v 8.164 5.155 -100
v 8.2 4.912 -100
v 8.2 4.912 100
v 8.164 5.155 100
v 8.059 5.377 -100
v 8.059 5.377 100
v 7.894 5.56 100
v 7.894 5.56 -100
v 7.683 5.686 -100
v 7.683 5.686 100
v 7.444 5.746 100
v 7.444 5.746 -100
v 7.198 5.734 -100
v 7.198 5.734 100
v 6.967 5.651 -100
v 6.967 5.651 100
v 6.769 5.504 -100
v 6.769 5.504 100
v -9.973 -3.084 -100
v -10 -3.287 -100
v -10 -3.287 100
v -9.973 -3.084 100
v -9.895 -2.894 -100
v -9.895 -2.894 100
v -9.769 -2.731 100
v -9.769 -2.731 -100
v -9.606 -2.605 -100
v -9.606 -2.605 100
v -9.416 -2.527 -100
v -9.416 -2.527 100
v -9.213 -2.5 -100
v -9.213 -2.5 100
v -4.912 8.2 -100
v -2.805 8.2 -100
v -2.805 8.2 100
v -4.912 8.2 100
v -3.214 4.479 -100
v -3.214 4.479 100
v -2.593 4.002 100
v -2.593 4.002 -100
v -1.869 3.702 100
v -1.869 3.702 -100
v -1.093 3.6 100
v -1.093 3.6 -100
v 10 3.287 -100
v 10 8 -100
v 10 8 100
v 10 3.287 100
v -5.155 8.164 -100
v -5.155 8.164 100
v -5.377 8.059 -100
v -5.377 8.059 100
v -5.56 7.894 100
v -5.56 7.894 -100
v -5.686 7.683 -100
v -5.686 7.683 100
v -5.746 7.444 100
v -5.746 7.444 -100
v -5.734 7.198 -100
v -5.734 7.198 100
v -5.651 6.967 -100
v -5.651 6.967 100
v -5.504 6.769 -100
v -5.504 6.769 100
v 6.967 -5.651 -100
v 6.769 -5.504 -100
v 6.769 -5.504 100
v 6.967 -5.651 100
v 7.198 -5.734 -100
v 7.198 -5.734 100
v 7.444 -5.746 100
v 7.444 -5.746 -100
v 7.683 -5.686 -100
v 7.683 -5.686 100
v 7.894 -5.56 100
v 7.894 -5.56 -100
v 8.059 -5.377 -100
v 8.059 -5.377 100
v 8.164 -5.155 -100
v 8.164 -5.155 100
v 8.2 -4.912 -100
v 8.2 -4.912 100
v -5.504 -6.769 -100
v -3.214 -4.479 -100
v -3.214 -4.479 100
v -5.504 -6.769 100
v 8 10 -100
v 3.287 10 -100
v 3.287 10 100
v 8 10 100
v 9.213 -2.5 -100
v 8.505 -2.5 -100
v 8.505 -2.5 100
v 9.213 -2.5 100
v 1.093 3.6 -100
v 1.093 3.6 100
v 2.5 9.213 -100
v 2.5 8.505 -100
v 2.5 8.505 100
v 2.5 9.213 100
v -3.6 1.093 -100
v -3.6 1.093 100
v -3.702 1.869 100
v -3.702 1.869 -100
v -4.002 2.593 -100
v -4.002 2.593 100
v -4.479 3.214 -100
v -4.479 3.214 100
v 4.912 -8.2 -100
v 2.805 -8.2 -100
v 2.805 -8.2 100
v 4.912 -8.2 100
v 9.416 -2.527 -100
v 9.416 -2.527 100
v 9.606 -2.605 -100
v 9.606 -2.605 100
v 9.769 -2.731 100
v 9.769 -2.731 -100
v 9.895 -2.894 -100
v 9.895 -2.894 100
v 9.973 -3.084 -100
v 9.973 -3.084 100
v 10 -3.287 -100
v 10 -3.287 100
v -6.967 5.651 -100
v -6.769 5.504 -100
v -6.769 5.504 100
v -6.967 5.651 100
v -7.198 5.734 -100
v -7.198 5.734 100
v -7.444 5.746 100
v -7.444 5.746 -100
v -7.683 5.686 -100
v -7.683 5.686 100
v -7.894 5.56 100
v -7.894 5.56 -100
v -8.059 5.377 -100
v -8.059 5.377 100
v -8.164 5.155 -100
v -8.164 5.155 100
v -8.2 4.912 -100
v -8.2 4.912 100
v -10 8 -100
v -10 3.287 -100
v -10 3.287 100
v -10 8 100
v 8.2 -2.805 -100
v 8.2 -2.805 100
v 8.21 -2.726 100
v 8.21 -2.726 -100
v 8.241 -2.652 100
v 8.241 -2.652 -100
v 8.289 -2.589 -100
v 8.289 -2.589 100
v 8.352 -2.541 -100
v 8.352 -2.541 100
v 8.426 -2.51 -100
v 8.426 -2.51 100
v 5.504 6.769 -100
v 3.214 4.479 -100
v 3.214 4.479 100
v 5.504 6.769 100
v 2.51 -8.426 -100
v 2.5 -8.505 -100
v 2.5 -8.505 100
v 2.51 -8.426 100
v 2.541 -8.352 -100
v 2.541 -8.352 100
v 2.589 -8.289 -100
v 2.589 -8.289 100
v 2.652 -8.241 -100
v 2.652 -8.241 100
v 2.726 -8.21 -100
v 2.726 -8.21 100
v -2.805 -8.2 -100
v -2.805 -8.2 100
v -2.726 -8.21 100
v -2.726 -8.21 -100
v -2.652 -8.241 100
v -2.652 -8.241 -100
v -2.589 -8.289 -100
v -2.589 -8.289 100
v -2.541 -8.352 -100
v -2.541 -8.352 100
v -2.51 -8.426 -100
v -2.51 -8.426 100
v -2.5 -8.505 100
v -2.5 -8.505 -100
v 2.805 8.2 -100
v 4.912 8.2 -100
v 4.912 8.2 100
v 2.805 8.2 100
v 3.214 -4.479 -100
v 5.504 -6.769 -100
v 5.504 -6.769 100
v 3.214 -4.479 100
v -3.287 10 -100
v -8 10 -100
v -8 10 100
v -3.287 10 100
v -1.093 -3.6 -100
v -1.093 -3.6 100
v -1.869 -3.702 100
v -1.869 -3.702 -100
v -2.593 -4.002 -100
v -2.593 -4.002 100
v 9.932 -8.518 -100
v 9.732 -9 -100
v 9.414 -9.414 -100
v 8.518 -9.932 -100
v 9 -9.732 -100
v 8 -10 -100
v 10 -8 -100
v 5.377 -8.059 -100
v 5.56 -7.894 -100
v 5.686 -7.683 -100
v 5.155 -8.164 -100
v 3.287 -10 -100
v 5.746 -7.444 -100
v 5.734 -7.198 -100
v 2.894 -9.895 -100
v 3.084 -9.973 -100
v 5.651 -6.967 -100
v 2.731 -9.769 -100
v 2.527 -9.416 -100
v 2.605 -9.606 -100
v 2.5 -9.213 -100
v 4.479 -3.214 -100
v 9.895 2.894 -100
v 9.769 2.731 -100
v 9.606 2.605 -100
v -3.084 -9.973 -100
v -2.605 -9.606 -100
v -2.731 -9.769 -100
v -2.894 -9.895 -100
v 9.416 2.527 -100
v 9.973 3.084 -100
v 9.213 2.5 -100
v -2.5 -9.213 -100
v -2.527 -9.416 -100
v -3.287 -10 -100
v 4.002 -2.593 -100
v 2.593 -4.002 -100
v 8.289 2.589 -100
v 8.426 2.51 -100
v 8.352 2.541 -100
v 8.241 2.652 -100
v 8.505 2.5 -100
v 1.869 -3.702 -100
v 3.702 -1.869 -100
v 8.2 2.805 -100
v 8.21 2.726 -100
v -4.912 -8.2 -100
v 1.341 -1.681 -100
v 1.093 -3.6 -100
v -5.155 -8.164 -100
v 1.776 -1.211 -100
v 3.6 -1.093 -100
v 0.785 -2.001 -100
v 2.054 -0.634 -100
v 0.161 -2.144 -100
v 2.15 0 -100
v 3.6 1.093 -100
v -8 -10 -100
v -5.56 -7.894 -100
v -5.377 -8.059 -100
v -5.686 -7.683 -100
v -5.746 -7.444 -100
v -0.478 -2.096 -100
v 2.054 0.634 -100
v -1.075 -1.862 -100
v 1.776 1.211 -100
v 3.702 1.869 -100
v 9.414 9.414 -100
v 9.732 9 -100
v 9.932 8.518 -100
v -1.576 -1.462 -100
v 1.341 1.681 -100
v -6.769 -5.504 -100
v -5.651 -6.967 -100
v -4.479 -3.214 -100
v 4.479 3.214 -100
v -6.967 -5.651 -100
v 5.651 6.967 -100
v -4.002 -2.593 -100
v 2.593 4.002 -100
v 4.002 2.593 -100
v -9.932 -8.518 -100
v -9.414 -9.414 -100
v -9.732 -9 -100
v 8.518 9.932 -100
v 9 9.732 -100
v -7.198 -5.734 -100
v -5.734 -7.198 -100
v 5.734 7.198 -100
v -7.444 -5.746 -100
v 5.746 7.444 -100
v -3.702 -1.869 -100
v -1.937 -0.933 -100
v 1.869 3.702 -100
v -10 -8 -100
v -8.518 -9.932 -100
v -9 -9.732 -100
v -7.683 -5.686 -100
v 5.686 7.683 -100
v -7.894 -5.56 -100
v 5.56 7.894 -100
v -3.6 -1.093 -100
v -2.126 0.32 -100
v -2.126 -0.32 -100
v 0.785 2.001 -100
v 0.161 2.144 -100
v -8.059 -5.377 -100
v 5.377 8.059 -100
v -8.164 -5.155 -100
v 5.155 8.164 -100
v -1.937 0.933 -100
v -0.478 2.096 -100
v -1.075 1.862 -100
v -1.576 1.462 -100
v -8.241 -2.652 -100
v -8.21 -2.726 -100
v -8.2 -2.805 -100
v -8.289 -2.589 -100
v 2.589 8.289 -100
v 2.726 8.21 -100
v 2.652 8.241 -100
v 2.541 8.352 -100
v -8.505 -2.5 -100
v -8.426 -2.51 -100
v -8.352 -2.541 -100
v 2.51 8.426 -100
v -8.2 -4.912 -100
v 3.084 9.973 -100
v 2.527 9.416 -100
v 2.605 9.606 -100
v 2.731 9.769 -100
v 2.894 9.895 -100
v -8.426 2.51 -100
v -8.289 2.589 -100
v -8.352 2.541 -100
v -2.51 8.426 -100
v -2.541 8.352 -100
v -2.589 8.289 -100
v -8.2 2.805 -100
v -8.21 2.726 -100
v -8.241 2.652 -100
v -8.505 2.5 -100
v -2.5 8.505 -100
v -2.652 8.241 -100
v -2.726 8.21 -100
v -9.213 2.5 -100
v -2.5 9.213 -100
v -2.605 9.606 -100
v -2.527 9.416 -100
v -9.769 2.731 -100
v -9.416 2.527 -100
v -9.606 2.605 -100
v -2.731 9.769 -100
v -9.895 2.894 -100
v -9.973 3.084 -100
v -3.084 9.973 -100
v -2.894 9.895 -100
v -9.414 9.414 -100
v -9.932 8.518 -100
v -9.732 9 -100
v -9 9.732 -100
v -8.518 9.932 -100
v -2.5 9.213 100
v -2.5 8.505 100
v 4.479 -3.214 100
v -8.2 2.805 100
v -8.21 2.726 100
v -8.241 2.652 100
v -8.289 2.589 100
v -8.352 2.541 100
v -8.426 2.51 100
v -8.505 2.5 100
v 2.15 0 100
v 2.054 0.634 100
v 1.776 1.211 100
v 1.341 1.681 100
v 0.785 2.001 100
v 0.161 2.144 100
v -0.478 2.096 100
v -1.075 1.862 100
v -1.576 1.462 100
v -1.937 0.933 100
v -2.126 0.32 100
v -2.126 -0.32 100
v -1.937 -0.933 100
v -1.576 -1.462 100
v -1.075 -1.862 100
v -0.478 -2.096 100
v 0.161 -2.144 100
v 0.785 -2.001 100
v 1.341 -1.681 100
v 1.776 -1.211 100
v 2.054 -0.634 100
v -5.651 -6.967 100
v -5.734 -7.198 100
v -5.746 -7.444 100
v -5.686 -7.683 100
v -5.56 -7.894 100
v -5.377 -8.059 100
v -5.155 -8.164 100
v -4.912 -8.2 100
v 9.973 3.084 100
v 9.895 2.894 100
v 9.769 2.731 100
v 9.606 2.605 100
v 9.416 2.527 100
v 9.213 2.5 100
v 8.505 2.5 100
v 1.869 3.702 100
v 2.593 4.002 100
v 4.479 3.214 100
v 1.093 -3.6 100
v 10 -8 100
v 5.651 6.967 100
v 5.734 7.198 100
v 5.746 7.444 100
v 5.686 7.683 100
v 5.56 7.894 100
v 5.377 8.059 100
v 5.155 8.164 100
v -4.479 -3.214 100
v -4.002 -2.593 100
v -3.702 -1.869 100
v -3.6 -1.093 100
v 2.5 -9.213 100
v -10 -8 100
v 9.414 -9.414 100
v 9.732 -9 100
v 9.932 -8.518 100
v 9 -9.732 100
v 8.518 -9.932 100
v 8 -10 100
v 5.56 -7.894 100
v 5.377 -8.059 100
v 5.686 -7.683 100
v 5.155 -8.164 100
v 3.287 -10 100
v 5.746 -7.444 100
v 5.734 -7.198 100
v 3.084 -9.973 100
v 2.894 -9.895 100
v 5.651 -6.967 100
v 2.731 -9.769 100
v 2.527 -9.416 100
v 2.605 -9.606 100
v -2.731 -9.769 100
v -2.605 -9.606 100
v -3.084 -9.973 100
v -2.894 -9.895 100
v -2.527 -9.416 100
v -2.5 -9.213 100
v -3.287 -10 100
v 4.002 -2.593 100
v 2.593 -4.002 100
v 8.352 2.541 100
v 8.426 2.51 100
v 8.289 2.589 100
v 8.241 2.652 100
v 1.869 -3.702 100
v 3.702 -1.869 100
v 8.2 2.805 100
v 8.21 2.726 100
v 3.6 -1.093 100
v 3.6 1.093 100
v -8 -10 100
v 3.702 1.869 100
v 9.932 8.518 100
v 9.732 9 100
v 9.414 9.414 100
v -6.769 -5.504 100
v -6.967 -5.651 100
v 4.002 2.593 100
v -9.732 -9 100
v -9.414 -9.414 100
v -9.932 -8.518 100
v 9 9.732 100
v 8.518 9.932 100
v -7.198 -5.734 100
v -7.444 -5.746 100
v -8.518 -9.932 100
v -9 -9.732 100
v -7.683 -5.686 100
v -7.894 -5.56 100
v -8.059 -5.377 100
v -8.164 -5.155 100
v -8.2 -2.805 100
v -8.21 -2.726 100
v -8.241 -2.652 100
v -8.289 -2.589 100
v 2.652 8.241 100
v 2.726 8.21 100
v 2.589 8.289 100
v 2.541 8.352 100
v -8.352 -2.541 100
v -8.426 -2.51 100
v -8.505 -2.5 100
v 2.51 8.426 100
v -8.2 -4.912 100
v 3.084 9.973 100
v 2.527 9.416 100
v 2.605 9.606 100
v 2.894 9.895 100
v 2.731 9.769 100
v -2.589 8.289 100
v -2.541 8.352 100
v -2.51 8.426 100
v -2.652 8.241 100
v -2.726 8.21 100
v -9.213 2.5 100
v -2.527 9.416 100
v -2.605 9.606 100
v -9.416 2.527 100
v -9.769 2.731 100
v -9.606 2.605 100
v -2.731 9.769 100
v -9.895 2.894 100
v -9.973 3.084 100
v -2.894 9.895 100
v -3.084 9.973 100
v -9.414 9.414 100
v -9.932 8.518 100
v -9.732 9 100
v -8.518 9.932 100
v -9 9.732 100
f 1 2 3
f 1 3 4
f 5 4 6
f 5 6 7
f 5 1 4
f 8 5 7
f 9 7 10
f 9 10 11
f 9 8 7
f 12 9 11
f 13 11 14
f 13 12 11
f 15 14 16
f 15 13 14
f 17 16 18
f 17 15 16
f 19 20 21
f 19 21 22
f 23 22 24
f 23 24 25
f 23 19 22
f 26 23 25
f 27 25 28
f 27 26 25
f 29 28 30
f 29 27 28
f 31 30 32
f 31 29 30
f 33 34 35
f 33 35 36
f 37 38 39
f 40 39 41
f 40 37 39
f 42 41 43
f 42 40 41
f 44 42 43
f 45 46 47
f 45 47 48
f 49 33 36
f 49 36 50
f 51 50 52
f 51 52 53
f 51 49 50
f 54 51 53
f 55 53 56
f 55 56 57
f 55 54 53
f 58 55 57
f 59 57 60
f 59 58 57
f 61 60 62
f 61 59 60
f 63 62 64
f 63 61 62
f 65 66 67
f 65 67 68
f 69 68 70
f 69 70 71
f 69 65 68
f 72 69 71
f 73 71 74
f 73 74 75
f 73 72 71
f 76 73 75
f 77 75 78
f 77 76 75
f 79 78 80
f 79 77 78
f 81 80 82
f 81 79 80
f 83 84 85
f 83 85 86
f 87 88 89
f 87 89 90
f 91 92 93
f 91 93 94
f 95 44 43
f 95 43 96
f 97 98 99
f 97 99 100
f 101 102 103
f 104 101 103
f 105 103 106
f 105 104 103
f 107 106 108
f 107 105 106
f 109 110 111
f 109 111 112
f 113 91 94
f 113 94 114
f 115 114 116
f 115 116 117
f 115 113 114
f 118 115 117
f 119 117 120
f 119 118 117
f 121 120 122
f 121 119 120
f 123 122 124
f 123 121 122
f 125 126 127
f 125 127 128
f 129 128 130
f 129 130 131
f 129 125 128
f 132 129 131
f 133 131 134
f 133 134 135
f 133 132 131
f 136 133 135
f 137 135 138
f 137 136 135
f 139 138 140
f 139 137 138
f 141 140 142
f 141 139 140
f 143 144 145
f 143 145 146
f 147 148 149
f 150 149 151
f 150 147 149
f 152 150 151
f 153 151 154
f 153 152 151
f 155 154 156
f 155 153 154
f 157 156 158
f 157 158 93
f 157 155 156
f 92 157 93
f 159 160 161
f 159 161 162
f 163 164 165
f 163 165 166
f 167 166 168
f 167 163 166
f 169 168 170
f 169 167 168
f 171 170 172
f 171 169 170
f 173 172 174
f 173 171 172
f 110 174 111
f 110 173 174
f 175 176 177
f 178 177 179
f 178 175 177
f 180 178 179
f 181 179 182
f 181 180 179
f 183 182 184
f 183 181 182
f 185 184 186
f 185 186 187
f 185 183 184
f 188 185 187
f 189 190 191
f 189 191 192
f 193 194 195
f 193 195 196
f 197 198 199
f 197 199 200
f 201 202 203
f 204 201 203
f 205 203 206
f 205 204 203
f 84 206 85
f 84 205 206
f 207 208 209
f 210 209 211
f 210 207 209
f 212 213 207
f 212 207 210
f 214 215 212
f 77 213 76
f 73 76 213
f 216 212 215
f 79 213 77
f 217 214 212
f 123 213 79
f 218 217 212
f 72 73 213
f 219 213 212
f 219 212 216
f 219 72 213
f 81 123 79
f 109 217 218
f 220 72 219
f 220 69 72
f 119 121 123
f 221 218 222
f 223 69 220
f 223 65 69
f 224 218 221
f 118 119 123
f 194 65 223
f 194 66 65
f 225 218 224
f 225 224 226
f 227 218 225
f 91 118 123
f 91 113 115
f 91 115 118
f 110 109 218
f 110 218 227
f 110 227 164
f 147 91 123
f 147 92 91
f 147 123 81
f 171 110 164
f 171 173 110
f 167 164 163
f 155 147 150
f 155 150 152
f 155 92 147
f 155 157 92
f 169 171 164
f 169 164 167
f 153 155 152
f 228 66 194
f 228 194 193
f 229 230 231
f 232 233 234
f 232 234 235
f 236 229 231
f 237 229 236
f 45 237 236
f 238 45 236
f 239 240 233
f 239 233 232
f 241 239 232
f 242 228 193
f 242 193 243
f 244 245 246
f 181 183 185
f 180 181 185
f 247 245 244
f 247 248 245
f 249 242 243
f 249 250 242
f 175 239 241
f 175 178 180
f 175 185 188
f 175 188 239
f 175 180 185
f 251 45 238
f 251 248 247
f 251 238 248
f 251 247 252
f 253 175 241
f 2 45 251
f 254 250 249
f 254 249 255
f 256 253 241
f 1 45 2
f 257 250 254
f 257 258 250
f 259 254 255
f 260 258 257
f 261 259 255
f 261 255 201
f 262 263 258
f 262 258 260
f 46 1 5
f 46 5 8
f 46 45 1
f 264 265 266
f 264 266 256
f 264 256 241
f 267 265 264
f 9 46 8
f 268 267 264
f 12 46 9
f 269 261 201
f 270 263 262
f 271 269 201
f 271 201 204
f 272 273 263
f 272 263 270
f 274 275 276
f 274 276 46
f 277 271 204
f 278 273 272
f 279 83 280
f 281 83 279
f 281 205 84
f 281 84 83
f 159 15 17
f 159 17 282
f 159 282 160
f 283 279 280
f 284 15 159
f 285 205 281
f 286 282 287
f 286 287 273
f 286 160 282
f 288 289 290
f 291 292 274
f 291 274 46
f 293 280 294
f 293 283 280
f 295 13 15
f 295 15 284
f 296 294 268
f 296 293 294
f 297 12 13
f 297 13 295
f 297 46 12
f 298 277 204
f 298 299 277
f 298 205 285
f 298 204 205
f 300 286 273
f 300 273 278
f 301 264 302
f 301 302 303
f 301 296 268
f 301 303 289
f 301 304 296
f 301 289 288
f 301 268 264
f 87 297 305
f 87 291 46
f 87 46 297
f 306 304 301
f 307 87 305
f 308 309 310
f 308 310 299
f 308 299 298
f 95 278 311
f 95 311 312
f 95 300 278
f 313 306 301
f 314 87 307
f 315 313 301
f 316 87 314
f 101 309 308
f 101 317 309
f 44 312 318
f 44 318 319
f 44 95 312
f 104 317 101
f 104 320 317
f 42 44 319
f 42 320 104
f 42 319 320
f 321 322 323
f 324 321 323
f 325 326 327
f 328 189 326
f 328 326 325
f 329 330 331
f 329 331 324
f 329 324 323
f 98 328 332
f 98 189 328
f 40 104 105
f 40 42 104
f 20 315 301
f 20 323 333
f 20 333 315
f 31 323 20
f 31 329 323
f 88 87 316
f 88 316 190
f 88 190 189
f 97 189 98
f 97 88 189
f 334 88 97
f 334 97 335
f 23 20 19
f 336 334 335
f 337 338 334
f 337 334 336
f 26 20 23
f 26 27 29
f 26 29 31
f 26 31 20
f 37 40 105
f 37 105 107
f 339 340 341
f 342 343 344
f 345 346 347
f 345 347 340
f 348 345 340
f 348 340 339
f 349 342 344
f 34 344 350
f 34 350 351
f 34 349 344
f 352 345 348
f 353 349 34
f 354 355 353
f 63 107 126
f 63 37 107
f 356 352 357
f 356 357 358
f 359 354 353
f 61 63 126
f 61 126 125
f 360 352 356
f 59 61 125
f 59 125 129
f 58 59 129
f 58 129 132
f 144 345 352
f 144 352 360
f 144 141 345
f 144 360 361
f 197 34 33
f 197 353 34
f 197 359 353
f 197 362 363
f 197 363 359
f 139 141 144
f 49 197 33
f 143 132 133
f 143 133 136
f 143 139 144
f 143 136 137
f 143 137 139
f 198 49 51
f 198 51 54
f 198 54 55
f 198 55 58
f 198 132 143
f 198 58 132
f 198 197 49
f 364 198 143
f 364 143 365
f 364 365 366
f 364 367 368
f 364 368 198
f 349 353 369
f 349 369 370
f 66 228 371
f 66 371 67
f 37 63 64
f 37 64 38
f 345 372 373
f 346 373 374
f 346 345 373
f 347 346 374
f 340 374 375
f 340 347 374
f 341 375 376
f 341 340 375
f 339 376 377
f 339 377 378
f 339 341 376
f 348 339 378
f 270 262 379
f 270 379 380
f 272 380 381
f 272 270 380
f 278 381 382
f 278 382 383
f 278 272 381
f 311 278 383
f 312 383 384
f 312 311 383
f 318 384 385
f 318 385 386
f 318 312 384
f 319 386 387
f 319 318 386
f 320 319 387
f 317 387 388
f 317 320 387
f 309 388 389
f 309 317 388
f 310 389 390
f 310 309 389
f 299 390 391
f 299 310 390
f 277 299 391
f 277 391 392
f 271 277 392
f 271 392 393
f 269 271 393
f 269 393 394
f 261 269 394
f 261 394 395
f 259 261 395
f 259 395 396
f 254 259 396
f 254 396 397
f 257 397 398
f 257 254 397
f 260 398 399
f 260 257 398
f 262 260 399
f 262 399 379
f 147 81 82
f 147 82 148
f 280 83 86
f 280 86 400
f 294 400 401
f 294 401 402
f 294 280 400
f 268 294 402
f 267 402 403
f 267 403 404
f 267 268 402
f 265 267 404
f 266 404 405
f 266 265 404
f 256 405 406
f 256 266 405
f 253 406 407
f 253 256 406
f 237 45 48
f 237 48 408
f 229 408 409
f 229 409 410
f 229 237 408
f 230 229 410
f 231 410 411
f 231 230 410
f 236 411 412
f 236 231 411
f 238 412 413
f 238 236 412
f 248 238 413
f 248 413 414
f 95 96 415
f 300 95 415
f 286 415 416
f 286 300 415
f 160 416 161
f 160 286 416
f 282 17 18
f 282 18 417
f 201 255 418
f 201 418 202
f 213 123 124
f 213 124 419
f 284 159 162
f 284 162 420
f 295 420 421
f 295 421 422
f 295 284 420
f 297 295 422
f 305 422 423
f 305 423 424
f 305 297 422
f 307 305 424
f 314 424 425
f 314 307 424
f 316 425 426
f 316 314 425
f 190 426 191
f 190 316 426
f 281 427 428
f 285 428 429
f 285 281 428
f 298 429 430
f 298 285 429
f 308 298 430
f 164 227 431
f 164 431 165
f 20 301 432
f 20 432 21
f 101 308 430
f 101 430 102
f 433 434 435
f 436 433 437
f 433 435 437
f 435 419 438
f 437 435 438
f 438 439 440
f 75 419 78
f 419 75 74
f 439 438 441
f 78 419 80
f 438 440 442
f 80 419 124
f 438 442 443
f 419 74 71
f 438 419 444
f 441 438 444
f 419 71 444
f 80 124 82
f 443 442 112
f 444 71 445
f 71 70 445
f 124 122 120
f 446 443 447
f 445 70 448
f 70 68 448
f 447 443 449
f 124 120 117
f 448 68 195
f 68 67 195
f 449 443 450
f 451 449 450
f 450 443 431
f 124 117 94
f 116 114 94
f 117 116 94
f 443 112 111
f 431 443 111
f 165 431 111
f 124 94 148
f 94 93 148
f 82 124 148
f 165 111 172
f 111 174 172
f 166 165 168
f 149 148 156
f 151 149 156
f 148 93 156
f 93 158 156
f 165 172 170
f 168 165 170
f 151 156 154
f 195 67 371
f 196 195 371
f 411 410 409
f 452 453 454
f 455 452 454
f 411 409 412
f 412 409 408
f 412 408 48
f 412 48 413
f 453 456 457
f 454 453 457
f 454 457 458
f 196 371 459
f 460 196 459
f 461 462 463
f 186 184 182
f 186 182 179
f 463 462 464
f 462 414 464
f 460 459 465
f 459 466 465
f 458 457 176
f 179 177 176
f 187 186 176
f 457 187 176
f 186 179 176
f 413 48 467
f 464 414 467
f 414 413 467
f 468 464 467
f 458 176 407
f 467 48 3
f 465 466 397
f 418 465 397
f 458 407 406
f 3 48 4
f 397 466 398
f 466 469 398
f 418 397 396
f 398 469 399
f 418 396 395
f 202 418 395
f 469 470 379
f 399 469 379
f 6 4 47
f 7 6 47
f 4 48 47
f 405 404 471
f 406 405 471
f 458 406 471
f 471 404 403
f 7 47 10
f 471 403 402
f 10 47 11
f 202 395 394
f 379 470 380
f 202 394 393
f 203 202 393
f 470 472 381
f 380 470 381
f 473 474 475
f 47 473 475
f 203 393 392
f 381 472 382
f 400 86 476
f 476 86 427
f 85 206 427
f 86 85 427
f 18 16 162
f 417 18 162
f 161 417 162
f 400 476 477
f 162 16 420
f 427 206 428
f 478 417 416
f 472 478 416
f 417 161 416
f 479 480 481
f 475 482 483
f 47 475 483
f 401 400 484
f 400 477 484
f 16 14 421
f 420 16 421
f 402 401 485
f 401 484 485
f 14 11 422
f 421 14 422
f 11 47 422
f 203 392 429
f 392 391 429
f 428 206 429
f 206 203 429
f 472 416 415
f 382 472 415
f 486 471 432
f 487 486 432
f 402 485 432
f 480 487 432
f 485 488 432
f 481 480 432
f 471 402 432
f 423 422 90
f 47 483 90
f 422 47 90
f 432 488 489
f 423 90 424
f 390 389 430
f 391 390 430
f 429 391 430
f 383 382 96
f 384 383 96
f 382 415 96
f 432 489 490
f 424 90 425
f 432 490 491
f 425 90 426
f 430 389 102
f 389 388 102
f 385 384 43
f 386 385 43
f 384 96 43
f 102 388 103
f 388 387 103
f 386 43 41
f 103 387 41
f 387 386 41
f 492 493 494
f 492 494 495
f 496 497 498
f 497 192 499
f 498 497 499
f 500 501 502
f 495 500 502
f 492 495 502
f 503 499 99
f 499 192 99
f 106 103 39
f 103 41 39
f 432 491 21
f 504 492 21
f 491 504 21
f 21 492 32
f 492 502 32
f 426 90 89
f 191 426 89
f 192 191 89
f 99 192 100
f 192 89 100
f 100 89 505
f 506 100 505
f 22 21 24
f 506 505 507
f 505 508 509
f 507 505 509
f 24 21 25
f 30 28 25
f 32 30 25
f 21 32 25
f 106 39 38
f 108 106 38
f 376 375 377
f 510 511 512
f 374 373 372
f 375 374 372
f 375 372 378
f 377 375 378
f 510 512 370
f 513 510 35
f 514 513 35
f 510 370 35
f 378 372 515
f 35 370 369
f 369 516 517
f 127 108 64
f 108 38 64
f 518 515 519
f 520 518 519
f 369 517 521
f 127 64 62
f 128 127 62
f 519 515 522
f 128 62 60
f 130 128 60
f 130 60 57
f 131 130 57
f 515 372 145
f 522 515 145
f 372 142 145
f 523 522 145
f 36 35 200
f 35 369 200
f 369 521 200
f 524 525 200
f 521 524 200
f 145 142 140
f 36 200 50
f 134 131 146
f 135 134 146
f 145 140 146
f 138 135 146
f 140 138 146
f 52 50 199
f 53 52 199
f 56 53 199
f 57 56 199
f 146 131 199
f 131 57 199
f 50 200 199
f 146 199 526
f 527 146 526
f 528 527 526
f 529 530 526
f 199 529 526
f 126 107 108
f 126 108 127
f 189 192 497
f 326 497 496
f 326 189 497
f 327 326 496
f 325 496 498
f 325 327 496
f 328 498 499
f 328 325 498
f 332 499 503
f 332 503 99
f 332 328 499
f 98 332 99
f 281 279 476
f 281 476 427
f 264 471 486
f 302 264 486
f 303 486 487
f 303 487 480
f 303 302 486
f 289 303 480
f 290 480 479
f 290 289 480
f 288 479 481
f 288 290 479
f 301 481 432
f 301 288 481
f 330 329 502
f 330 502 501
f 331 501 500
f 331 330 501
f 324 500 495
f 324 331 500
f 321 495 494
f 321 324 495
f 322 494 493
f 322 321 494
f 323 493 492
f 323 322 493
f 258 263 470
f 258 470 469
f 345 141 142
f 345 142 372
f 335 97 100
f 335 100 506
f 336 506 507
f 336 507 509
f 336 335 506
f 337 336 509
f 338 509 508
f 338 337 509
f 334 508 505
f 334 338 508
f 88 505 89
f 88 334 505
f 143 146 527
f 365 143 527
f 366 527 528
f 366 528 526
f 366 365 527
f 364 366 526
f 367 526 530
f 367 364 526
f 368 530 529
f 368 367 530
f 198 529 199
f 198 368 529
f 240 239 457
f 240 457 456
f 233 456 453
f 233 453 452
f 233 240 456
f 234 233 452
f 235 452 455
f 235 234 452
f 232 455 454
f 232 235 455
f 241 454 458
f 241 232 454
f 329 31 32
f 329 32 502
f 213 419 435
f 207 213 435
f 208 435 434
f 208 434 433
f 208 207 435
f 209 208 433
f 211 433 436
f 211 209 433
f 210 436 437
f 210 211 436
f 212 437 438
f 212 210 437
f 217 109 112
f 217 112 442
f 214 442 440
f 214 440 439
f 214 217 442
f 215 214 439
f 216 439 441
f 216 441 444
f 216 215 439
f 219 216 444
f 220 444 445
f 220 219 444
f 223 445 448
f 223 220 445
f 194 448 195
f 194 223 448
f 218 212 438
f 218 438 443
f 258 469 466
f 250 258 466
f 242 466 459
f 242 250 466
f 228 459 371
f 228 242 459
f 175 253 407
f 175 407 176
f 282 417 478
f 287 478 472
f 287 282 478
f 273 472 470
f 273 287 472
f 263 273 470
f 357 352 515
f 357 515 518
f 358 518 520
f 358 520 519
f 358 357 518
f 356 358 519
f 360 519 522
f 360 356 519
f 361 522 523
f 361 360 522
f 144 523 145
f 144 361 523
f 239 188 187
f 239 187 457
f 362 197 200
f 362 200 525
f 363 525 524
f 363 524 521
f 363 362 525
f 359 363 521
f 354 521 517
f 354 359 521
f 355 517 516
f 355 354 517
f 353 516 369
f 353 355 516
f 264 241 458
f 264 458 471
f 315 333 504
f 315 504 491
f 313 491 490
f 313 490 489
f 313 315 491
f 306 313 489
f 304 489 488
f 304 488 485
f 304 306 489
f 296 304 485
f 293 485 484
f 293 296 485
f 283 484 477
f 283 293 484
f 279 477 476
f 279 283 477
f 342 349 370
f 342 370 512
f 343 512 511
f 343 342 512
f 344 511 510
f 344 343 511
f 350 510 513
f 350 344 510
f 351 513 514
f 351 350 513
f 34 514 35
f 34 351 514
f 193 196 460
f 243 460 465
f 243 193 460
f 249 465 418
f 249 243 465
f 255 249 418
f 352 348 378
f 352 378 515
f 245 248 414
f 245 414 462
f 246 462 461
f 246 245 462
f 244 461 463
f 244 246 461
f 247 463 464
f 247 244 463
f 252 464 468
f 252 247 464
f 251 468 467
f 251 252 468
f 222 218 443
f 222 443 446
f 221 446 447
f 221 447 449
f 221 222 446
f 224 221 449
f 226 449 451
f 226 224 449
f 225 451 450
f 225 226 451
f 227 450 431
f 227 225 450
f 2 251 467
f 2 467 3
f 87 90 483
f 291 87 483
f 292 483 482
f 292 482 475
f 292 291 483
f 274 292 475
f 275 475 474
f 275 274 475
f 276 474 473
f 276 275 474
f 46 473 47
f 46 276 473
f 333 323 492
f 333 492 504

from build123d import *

# Parameters (mm, degrees)
BOSS_EXTRUDE1_DEPTH      = 100
BOSS_EXTRUDE1_DEPTH_BACK = 100
SKETCH3_R                = 2.15


with BuildPart() as part:
    # Sketch3 → Boss-Extrude1 (new, two sides: drawn at the far end of the back side and taken through both)
    with BuildSketch(Plane.XY.offset(-BOSS_EXTRUDE1_DEPTH_BACK)):
        with BuildLine():
            Line((3.2874, 10), (8, 10))
            ThreePointArc((8, 10), (9.414213562, 9.414213562), (10, 8))
            Line((10, 8), (10, 3.2874))
            ThreePointArc((10, 3.2874), (9.76937588, 2.73062412), (9.2126, 2.5))
            Line((9.2126, 2.5), (8.5048, 2.5))
            ThreePointArc((8.5048, 2.5), (8.289273853, 2.589273853), (8.2, 2.8048))
            Line((8.2, 2.8048), (8.2, 4.9118))
            ThreePointArc((8.2, 4.9118), (7.682565253, 5.686195824), (6.769103096, 5.504496904))
            Line((6.769103096, 5.504496904), (4.478679656, 3.214073464))
            ThreePointArc((4.478679656, 3.214073464), (3.828361402, 2.240803418), (3.6, 1.092753121))
            Line((3.6, 1.092753121), (3.6, -1.092753121))
            ThreePointArc((3.6, -1.092753121), (3.828361402, -2.240803418), (4.478679656, -3.214073464))
            Line((4.478679656, -3.214073464), (6.769103096, -5.504496904))
            ThreePointArc((6.769103096, -5.504496904), (7.682565253, -5.686195824), (8.2, -4.9118))
            Line((8.2, -4.9118), (8.2, -2.8048))
            ThreePointArc((8.2, -2.8048), (8.289273853, -2.589273853), (8.5048, -2.5))
            Line((8.5048, -2.5), (9.2126, -2.5))
            ThreePointArc((9.2126, -2.5), (9.76937588, -2.73062412), (10, -3.2874))
            Line((10, -3.2874), (10, -8))
            ThreePointArc((10, -8), (9.414213562, -9.414213562), (8, -10))
            Line((8, -10), (3.2874, -10))
            ThreePointArc((3.2874, -10), (2.73062412, -9.76937588), (2.5, -9.2126))
            Line((2.5, -9.2126), (2.5, -8.5048))
            ThreePointArc((2.5, -8.5048), (2.589273853, -8.289273853), (2.8048, -8.2))
            Line((2.8048, -8.2), (4.9118, -8.2))
            ThreePointArc((4.9118, -8.2), (5.686195824, -7.682565253), (5.504496904, -6.769103096))
            Line((5.504496904, -6.769103096), (3.214073464, -4.478679656))
            ThreePointArc((3.214073464, -4.478679656), (2.240803418, -3.828361402), (1.092753121, -3.6))
            Line((1.092753121, -3.6), (-1.092753121, -3.6))
            ThreePointArc((-1.092753121, -3.6), (-2.240803418, -3.828361402), (-3.214073464, -4.478679656))
            Line((-3.214073464, -4.478679656), (-5.504496904, -6.769103096))
            ThreePointArc((-5.504496904, -6.769103096), (-5.686195824, -7.682565253), (-4.9118, -8.2))
            Line((-4.9118, -8.2), (-2.8048, -8.2))
            ThreePointArc((-2.8048, -8.2), (-2.589273853, -8.289273853), (-2.5, -8.5048))
            Line((-2.5, -8.5048), (-2.5, -9.2126))
            ThreePointArc((-2.5, -9.2126), (-2.73062412, -9.76937588), (-3.2874, -10))
            Line((-3.2874, -10), (-8, -10))
            ThreePointArc((-8, -10), (-9.414213562, -9.414213562), (-10, -8))
            Line((-10, -8), (-10, -3.2874))
            ThreePointArc((-10, -3.2874), (-9.76937588, -2.73062412), (-9.2126, -2.5))
            Line((-9.2126, -2.5), (-8.5048, -2.5))
            ThreePointArc((-8.5048, -2.5), (-8.289273853, -2.589273853), (-8.2, -2.8048))
            Line((-8.2, -2.8048), (-8.2, -4.9118))
            ThreePointArc((-8.2, -4.9118), (-7.682565253, -5.686195824), (-6.769103096, -5.504496904))
            Line((-6.769103096, -5.504496904), (-4.478679656, -3.214073464))
            ThreePointArc((-4.478679656, -3.214073464), (-3.828361402, -2.240803418), (-3.6, -1.092753121))
            Line((-3.6, -1.092753121), (-3.6, 1.092753121))
            ThreePointArc((-3.6, 1.092753121), (-3.828361402, 2.240803418), (-4.478679656, 3.214073464))
            Line((-4.478679656, 3.214073464), (-6.769103096, 5.504496904))
            ThreePointArc((-6.769103096, 5.504496904), (-7.682565253, 5.686195824), (-8.2, 4.9118))
            Line((-8.2, 4.9118), (-8.2, 2.8048))
            ThreePointArc((-8.2, 2.8048), (-8.289273853, 2.589273853), (-8.5048, 2.5))
            Line((-8.5048, 2.5), (-9.2126, 2.5))
            ThreePointArc((-9.2126, 2.5), (-9.76937588, 2.73062412), (-10, 3.2874))
            Line((-10, 3.2874), (-10, 8))
            ThreePointArc((-10, 8), (-9.414213562, 9.414213562), (-8, 10))
            Line((-8, 10), (-3.2874, 10))
            ThreePointArc((-3.2874, 10), (-2.73062412, 9.76937588), (-2.5, 9.2126))
            Line((-2.5, 9.2126), (-2.5, 8.5048))
            ThreePointArc((-2.5, 8.5048), (-2.589273853, 8.289273853), (-2.8048, 8.2))
            Line((-2.8048, 8.2), (-4.9118, 8.2))
            ThreePointArc((-4.9118, 8.2), (-5.686195824, 7.682565253), (-5.504496904, 6.769103096))
            Line((-5.504496904, 6.769103096), (-3.214073464, 4.478679656))
            ThreePointArc((-3.214073464, 4.478679656), (-2.240803418, 3.828361402), (-1.092753121, 3.6))
            Line((-1.092753121, 3.6), (1.092753121, 3.6))
            ThreePointArc((1.092753121, 3.6), (2.240803418, 3.828361402), (3.214073464, 4.478679656))
            Line((3.214073464, 4.478679656), (5.504496904, 6.769103096))
            ThreePointArc((5.504496904, 6.769103096), (5.686195824, 7.682565253), (4.9118, 8.2))
            Line((4.9118, 8.2), (2.8048, 8.2))
            ThreePointArc((2.8048, 8.2), (2.589273853, 8.289273853), (2.5, 8.5048))
            Line((2.5, 8.5048), (2.5, 9.2126))
            ThreePointArc((2.5, 9.2126), (2.73062412, 9.76937588), (3.2874, 10))
        make_face()
        Circle(SKETCH3_R, mode=Mode.SUBTRACT)
    extrude(amount=BOSS_EXTRUDE1_DEPTH + BOSS_EXTRUDE1_DEPTH_BACK)


solid = part.part
